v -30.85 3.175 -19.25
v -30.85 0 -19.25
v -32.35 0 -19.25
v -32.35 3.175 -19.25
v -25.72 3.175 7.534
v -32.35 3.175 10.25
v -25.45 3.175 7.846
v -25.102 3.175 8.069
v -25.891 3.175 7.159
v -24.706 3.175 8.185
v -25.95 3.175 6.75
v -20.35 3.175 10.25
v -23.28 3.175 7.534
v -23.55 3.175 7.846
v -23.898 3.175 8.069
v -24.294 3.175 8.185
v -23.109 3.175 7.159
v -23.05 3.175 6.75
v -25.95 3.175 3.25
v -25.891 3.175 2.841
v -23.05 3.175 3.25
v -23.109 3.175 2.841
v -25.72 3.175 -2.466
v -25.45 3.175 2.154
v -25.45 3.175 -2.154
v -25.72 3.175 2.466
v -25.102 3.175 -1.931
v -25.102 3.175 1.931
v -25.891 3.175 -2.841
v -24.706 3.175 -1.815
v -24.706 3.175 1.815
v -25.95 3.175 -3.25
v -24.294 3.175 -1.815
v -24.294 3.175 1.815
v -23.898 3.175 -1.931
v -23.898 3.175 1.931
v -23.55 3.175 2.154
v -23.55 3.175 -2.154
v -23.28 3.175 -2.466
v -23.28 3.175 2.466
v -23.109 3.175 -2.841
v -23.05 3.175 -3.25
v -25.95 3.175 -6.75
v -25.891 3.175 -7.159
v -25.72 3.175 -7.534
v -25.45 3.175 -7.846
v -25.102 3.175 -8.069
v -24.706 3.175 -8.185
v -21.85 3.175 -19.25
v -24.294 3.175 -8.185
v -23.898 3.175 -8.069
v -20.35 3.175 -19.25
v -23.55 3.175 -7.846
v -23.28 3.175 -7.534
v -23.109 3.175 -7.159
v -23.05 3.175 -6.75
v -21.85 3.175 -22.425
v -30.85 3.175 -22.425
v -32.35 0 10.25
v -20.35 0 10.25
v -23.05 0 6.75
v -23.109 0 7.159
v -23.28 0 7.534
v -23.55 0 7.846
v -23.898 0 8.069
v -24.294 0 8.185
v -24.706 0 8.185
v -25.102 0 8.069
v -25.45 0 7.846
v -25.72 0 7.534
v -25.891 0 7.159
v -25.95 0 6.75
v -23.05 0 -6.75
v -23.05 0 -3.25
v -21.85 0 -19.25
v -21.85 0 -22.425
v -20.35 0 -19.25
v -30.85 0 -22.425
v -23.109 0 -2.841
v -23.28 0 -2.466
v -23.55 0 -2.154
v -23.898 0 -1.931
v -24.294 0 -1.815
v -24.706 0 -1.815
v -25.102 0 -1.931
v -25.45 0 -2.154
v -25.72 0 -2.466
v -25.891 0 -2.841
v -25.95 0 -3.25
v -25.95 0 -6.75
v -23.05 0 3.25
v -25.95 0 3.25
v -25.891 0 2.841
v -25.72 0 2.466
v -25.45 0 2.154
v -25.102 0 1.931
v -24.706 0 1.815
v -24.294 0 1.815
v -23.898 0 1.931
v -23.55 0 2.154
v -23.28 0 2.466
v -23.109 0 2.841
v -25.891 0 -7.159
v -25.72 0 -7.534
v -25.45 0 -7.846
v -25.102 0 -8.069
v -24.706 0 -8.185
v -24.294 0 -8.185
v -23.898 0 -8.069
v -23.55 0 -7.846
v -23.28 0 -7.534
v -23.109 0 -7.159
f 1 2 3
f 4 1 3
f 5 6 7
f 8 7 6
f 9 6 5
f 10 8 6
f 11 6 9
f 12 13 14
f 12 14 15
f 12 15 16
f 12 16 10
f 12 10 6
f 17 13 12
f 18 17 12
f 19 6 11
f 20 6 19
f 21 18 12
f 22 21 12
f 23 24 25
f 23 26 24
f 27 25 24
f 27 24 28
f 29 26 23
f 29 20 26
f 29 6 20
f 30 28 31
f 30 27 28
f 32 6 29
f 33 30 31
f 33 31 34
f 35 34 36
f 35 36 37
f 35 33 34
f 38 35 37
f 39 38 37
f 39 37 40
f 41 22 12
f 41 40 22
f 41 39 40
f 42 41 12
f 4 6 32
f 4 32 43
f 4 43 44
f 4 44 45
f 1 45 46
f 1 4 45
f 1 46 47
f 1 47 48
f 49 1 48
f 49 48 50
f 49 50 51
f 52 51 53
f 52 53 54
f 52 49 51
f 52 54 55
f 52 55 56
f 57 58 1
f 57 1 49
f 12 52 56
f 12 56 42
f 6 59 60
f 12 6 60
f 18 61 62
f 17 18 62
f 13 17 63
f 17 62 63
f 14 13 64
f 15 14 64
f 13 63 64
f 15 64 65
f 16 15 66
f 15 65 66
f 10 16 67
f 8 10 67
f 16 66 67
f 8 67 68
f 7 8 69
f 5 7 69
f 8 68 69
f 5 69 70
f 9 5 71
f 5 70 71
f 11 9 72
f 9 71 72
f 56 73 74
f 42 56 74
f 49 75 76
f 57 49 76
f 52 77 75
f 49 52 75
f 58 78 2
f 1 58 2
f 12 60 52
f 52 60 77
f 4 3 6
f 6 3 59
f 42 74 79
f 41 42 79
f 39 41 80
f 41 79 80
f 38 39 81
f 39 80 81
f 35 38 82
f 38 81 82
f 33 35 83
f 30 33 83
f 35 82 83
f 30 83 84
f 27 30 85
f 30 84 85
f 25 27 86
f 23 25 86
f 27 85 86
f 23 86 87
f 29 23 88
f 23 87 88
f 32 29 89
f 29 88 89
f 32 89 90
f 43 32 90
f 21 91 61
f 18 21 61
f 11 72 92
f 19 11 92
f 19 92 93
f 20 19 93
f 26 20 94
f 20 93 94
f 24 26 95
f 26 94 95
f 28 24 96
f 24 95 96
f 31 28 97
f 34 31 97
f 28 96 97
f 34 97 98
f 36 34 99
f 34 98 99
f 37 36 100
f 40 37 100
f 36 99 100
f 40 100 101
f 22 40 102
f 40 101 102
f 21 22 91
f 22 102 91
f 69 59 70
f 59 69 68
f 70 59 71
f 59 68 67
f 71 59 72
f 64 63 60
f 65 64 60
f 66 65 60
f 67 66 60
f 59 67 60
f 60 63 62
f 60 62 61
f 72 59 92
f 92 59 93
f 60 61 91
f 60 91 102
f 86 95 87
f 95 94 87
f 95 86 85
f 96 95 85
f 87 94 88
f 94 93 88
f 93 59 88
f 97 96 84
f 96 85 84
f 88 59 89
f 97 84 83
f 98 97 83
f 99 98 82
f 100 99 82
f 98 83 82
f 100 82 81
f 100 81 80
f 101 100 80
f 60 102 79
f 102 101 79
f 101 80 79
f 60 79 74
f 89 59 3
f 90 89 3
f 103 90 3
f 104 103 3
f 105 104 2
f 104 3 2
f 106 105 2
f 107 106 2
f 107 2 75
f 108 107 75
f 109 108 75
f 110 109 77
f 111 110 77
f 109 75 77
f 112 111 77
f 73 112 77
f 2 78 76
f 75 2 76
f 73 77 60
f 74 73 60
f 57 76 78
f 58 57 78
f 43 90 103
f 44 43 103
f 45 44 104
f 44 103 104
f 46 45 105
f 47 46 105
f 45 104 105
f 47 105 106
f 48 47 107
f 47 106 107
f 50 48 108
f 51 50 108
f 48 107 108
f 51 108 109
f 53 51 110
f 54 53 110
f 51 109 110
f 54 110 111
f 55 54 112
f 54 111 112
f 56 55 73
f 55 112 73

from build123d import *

# Parameters (mm, degrees)
BOSS_EXTRUDE1_DEPTH = 3.175


with BuildPart() as part:
    # Sketch1 → Boss-Extrude1 (new body)
    with BuildSketch(Plane(origin=(0, 0, 0), x_dir=(1, 0, 0), z_dir=(0, 1, 0))):
        Polygon((-32.35, -10.25), (-20.35, -10.25), (-20.35, 19.25), (-21.85, 19.25), (-21.85, 22.425), (-30.85, 22.425), (-30.85, 19.25), (-32.35, 19.25), align=None)
        with BuildLine():
            Line((-25.95, -6.75), (-25.95, -3.25))
            ThreePointArc((-25.95, -3.25), (-24.5, -1.8), (-23.05, -3.25))
            Line((-23.05, -3.25), (-23.05, -6.75))
            ThreePointArc((-23.05, -6.75), (-24.5, -8.2), (-25.95, -6.75))
        make_face(mode=Mode.SUBTRACT)
        with BuildLine():
            Line((-25.95, 3.25), (-25.95, 6.75))
            ThreePointArc((-25.95, 6.75), (-24.5, 8.2), (-23.05, 6.75))
            Line((-23.05, 6.75), (-23.05, 3.25))
            ThreePointArc((-23.05, 3.25), (-24.5, 1.8), (-25.95, 3.25))
        make_face(mode=Mode.SUBTRACT)
    extrude(amount=BOSS_EXTRUDE1_DEPTH)


solid = part.part
